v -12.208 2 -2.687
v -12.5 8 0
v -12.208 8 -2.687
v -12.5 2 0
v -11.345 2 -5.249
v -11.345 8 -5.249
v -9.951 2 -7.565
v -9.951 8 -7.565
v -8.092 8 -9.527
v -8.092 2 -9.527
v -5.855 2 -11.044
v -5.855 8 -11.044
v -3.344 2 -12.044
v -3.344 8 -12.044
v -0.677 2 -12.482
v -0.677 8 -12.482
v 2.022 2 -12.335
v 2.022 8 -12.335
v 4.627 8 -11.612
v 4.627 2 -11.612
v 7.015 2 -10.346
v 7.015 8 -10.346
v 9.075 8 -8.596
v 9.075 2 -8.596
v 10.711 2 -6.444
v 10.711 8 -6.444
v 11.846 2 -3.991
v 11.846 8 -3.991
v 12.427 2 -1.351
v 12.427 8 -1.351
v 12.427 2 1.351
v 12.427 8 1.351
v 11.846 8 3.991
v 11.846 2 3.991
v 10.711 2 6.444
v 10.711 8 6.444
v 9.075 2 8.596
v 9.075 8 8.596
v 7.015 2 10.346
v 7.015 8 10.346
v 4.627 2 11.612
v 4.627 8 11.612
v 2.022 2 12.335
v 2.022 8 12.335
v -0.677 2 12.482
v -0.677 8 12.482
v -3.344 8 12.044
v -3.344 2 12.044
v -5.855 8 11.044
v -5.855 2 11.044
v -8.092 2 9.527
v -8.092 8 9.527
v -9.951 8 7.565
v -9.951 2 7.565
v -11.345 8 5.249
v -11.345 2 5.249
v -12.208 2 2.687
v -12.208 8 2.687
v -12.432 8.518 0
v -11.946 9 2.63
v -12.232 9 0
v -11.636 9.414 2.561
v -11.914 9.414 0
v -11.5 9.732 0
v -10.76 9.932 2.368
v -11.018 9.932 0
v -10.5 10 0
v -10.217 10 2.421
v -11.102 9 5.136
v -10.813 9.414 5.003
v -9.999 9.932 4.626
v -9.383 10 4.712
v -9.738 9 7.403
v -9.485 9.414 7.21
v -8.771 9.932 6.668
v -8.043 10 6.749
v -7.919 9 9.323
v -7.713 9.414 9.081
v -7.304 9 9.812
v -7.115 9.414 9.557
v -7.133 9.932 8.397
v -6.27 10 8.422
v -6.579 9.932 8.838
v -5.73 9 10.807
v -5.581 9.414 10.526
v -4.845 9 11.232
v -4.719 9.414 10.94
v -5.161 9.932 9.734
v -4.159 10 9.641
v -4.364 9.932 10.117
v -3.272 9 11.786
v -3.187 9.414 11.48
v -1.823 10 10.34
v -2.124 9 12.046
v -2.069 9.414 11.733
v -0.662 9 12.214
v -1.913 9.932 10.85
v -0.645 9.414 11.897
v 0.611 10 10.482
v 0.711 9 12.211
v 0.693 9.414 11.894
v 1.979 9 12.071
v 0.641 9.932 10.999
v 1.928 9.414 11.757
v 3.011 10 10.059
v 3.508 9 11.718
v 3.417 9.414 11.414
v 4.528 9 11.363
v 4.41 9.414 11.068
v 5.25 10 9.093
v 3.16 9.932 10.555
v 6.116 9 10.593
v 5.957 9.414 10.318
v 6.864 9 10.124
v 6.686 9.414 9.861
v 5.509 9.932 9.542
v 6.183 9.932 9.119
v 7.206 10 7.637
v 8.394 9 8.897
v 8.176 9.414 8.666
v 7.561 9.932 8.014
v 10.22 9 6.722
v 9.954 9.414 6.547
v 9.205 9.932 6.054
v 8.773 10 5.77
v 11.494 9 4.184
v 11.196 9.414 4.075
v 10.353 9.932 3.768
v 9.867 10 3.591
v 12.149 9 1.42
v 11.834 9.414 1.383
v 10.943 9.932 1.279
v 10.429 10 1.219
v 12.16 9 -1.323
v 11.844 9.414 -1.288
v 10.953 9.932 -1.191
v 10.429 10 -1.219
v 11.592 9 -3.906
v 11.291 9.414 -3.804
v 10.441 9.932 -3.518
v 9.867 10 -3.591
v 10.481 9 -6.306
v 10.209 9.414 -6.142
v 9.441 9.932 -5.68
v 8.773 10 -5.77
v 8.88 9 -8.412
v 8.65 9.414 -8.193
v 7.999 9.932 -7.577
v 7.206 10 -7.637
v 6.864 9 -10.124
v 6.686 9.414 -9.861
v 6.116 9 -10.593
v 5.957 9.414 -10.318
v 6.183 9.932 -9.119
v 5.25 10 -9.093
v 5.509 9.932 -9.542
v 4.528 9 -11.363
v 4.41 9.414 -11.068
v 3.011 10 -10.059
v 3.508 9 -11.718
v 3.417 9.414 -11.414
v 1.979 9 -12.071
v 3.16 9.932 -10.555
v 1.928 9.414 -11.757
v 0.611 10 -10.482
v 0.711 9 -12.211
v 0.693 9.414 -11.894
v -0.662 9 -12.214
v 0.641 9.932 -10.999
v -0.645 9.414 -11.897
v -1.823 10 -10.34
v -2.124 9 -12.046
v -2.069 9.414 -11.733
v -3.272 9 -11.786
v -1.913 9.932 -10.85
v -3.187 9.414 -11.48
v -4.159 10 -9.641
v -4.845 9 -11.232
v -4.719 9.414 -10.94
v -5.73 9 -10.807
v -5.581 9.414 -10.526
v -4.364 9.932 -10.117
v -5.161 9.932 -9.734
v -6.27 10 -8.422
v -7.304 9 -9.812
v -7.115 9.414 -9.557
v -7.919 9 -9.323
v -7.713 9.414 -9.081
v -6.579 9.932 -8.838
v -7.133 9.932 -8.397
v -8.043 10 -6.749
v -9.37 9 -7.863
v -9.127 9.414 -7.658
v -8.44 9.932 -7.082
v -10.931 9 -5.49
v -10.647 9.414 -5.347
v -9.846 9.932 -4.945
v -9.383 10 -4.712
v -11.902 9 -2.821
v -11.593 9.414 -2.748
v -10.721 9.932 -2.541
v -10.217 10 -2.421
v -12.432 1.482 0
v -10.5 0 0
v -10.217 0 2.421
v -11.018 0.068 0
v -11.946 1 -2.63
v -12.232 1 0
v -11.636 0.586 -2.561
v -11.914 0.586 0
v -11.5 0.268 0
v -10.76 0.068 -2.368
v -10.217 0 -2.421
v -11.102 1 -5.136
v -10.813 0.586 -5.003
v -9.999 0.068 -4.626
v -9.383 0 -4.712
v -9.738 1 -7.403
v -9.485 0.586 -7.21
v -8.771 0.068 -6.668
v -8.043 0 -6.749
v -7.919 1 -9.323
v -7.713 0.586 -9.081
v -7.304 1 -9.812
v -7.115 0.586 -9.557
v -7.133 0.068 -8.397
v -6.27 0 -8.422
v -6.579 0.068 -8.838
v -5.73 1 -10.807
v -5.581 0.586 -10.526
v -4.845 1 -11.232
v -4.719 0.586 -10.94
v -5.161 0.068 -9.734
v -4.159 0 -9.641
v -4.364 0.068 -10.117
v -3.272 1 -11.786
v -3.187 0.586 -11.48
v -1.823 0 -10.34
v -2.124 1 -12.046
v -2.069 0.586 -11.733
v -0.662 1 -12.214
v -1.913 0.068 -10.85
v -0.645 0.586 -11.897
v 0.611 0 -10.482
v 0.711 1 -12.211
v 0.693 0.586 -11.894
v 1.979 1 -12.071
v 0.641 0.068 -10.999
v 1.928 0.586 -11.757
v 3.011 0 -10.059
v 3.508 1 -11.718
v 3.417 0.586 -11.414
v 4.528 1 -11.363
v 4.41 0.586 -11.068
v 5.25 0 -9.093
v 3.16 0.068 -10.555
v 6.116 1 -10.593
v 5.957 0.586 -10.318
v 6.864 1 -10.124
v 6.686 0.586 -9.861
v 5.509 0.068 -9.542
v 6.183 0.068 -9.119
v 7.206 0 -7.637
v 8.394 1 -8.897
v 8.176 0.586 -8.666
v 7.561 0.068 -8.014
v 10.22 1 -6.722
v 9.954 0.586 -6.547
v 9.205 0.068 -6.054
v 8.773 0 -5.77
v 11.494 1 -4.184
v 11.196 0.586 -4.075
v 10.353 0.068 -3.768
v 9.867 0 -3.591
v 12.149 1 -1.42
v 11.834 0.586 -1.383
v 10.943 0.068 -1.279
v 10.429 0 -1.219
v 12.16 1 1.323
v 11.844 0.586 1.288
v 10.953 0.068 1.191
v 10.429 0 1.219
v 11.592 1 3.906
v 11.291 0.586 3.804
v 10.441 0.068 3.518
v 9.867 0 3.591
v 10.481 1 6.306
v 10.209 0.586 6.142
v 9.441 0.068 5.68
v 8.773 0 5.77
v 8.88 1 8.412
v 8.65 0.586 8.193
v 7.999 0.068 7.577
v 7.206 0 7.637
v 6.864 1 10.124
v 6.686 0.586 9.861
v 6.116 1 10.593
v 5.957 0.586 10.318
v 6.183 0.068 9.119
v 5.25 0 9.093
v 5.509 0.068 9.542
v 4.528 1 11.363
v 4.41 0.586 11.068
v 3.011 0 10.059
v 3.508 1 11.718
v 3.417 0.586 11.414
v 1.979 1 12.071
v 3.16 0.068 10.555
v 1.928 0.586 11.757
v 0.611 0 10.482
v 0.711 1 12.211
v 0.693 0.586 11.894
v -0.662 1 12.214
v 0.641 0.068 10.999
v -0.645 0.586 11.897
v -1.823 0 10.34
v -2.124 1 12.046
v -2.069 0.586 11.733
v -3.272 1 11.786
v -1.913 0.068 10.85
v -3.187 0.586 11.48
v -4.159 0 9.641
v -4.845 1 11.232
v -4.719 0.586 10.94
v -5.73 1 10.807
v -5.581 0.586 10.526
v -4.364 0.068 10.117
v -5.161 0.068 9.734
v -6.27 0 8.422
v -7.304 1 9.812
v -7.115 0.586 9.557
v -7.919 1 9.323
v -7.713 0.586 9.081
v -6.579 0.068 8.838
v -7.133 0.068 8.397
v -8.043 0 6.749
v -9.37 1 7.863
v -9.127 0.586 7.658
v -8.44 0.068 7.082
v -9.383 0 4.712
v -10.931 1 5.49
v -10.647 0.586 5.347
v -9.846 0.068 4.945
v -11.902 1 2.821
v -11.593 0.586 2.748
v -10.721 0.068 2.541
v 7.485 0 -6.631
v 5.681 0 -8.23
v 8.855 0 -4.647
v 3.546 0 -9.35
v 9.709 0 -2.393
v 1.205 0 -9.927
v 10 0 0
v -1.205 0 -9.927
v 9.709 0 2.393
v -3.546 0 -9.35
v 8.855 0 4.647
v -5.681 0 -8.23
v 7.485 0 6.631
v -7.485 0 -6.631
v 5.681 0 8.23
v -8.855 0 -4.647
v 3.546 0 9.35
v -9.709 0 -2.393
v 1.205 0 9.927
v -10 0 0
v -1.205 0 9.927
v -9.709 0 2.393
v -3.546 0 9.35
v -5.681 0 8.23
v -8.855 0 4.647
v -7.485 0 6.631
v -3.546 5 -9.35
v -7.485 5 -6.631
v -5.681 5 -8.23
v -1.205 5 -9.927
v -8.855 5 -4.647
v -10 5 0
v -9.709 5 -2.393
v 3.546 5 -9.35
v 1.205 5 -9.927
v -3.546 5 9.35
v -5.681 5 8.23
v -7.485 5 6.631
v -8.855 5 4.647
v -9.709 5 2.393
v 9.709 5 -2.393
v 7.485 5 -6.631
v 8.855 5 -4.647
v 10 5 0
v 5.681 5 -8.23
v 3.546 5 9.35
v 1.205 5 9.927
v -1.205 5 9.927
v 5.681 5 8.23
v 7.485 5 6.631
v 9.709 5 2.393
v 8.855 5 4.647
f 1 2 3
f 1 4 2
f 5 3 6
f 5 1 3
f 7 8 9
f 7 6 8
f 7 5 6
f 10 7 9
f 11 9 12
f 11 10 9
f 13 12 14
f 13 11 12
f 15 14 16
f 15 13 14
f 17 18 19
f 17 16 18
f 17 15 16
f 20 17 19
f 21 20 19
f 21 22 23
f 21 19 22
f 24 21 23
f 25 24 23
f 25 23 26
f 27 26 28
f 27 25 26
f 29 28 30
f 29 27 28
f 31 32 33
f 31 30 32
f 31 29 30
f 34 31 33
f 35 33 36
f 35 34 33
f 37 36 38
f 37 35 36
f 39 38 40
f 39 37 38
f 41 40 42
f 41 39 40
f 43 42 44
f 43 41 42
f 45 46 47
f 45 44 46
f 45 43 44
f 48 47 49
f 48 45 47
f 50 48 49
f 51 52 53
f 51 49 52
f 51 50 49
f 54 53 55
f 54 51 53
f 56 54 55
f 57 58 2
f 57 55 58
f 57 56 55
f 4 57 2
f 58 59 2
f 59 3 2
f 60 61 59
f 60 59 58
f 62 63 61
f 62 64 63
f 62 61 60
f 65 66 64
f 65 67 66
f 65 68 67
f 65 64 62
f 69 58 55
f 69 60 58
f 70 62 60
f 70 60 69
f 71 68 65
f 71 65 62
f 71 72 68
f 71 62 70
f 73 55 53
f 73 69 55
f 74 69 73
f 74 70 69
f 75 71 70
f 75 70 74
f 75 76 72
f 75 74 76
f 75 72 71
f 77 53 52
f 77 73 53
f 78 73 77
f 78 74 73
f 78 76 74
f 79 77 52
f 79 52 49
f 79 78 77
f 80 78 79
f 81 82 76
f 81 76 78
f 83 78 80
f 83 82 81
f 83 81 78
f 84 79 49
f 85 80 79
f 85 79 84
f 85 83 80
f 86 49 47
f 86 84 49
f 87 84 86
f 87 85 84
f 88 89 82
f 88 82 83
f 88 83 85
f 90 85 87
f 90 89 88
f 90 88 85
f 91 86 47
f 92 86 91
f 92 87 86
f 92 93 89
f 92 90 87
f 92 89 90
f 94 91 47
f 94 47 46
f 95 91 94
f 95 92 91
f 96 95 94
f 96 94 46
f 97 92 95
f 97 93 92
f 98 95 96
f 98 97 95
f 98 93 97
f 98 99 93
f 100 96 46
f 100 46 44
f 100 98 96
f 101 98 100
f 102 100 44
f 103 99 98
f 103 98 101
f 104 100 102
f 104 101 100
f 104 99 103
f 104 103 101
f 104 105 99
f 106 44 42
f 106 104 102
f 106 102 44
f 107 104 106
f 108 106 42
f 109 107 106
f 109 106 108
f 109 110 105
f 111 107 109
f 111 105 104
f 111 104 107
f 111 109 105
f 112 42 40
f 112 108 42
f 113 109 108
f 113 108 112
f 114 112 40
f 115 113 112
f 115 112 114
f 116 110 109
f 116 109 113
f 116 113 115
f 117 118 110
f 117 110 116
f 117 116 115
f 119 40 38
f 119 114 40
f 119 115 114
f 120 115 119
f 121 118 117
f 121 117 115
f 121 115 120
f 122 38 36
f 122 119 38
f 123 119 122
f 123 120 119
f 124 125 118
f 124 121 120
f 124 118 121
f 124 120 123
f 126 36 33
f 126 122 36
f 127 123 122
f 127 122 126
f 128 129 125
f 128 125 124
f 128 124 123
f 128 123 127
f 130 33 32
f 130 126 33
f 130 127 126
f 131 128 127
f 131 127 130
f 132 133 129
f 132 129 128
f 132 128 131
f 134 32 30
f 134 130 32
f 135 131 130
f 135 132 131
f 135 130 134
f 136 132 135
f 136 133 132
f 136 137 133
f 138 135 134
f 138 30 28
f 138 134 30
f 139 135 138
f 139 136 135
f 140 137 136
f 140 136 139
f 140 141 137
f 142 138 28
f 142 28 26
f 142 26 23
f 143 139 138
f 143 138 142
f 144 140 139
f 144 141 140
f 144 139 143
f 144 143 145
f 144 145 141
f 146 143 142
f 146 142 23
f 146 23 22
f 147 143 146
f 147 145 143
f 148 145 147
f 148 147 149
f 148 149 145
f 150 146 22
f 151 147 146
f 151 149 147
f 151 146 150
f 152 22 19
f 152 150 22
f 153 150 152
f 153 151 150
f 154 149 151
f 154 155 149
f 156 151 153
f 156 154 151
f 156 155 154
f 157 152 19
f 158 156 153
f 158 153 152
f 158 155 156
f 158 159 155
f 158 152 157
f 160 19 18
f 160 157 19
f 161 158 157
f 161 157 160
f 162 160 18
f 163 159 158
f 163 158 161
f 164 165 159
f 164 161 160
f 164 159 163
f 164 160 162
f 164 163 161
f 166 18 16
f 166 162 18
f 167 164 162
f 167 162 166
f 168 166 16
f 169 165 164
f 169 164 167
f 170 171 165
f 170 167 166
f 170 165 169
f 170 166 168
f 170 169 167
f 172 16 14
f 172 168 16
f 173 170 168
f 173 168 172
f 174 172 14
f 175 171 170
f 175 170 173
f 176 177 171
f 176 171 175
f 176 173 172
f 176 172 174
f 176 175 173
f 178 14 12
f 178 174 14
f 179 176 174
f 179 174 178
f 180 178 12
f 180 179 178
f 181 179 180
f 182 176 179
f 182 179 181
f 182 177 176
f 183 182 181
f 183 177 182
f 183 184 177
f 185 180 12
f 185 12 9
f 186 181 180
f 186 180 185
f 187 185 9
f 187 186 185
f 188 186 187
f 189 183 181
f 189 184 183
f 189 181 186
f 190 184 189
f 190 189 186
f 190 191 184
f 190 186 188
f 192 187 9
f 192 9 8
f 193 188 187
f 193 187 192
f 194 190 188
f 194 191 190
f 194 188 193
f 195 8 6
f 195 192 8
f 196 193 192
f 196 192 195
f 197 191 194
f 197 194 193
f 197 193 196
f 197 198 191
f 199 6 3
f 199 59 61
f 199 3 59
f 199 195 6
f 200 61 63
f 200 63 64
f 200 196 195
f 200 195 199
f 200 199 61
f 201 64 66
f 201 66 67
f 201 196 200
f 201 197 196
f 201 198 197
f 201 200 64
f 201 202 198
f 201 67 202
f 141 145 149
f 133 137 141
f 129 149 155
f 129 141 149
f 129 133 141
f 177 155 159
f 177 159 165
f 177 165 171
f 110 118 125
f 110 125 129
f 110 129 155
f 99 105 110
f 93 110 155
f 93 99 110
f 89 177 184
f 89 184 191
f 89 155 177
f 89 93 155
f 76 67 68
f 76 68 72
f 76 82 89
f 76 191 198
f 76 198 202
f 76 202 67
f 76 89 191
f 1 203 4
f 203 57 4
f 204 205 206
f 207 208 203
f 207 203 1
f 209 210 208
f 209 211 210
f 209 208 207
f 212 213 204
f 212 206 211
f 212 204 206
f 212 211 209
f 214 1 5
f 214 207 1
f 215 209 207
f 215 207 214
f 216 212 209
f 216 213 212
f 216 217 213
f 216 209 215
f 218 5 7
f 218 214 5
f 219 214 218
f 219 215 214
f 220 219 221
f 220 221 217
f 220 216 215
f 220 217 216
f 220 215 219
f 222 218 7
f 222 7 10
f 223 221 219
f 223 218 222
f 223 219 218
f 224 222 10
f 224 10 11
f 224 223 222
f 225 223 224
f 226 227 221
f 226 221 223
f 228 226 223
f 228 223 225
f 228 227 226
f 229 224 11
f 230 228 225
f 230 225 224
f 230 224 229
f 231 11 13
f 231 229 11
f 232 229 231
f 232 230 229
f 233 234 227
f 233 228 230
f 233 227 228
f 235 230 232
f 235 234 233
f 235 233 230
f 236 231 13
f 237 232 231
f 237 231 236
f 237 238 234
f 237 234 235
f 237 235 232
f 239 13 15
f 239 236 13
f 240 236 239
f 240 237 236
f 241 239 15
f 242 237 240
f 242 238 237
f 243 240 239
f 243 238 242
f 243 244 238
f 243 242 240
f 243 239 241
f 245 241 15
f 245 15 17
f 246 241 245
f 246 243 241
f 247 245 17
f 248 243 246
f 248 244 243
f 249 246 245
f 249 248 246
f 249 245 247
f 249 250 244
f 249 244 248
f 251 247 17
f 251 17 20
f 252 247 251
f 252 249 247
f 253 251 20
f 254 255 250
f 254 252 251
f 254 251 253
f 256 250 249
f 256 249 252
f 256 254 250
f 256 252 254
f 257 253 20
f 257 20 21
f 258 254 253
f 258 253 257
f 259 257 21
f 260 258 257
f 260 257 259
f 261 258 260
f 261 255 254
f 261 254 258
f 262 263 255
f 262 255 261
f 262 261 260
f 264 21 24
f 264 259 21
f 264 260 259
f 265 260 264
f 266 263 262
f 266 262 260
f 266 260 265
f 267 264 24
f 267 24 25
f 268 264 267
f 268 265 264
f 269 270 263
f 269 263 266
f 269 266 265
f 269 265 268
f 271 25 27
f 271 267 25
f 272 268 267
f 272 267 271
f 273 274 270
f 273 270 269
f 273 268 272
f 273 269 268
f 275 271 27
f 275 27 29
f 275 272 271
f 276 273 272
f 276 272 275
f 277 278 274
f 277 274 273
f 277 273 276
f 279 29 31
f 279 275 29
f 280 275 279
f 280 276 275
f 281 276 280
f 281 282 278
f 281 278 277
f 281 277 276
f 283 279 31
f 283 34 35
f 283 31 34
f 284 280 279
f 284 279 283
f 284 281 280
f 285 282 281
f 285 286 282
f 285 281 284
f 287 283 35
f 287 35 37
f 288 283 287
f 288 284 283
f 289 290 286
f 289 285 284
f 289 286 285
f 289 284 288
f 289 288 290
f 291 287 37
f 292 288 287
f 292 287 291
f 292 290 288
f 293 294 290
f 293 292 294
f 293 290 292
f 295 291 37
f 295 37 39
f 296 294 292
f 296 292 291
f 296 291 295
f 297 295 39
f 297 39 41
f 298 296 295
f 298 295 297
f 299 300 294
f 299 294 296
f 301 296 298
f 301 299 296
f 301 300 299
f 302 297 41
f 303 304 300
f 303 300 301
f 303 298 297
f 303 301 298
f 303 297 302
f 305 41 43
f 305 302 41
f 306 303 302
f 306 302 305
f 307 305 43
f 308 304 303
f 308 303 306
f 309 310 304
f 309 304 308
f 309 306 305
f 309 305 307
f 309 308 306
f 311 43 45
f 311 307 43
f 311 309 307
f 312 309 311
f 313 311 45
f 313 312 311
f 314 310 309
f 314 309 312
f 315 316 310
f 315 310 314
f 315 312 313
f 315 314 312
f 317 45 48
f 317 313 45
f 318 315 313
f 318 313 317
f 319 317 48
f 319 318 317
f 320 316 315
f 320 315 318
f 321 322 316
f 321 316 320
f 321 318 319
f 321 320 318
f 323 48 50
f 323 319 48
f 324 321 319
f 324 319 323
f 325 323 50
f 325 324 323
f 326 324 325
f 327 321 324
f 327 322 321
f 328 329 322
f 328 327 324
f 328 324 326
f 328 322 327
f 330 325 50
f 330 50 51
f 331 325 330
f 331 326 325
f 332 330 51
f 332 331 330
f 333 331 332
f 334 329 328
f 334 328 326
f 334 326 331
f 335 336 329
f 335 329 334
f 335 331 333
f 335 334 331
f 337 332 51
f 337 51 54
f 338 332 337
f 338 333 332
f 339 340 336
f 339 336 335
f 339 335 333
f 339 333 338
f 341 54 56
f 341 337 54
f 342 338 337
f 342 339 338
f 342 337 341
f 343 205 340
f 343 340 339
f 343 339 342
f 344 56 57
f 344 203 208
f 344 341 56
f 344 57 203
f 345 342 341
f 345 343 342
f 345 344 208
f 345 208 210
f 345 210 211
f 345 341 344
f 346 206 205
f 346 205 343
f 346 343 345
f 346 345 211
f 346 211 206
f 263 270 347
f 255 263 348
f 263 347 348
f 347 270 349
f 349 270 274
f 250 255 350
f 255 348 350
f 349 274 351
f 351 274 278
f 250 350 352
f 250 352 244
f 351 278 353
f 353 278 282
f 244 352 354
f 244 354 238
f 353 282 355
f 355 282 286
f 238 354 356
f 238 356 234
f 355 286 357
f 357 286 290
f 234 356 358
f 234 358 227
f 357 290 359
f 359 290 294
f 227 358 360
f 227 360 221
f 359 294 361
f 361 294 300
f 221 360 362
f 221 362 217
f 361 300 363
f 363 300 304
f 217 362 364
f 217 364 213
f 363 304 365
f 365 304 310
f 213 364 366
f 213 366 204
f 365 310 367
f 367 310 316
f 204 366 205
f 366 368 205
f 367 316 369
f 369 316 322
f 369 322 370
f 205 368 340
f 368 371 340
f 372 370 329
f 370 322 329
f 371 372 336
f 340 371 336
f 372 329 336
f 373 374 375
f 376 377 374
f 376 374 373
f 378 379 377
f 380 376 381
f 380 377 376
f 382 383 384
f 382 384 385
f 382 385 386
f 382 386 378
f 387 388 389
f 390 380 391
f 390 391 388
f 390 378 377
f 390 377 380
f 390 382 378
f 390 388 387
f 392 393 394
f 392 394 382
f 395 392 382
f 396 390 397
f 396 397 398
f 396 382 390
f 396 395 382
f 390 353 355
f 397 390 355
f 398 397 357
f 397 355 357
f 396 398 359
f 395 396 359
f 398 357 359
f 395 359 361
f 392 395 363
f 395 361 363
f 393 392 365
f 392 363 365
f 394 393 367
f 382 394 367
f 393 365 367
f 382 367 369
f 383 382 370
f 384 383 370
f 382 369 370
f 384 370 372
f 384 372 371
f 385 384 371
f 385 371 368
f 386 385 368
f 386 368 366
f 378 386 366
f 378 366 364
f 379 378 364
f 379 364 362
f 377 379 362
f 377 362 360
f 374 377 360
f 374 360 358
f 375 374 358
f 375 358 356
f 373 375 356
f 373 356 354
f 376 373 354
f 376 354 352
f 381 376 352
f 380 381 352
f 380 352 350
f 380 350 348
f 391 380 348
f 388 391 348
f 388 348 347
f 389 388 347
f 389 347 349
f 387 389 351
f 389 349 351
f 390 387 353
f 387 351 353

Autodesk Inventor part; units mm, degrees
ref_plane "YZ Plane" through (0, 0, 0) normal (1, 0, 0) x (0, 1, 0)
ref_plane "XZ Plane" through (0, 0, 0) normal (0, 1, 0) x (-1, 0, 0)
ref_plane "XY Plane" through (0, 0, 0) normal (0, 0, 1) x (1, 0, 0)
sketch "Sketch1" plane through (0, 0, 0) normal (0, 1, 0) x (-1, 0, 0)
  circle A0 centre (0, 0) radius 12.5
  dimension "d0" = 25
extrude "Extrusion1" add sketch "Sketch1" along normal blind 10
sketch "Sketch2" plane through (0, 0, 0) normal (0, -1, 0) x (1, 0, 0)
  circle A0 centre (0, 0) radius 10
  dimension "d3" = 20
extrude "Extrusion2" cut sketch "Sketch2" against normal blind 5
fillet "Fillet1" radius 2 2 edges at (12.5, 10, 0) (12.5, 0, 0)
sketch "Sketch3" plane through (0, 0, 0) normal (0, 0, 1) x (1, 0, 0)
  point P0 (0, 0)
sketch "Sketch4" plane through (0, 5, 0) normal (0, -1, 0) x (1, 0, 0)
  point P0 (0, 0)
equation "\"BendRadius\" = Thickness"
equation "\"BendReliefWidth\" = Thickness"
equation "\"BendReliefDepth\" = 0.5 * Thickness"
equation "\"CornerReliefSize\" = 4 * Thickness"
equation "\"MinimumRemnant\" = 2 * Thickness"
equation "\"TransitionRadius\" = BendRadius"
equation "\"JacobiRadiusSize\" = BendRadius"
equation "\"GapSize\" = Thickness"
equation "\"Thickness\" = 0.5"
